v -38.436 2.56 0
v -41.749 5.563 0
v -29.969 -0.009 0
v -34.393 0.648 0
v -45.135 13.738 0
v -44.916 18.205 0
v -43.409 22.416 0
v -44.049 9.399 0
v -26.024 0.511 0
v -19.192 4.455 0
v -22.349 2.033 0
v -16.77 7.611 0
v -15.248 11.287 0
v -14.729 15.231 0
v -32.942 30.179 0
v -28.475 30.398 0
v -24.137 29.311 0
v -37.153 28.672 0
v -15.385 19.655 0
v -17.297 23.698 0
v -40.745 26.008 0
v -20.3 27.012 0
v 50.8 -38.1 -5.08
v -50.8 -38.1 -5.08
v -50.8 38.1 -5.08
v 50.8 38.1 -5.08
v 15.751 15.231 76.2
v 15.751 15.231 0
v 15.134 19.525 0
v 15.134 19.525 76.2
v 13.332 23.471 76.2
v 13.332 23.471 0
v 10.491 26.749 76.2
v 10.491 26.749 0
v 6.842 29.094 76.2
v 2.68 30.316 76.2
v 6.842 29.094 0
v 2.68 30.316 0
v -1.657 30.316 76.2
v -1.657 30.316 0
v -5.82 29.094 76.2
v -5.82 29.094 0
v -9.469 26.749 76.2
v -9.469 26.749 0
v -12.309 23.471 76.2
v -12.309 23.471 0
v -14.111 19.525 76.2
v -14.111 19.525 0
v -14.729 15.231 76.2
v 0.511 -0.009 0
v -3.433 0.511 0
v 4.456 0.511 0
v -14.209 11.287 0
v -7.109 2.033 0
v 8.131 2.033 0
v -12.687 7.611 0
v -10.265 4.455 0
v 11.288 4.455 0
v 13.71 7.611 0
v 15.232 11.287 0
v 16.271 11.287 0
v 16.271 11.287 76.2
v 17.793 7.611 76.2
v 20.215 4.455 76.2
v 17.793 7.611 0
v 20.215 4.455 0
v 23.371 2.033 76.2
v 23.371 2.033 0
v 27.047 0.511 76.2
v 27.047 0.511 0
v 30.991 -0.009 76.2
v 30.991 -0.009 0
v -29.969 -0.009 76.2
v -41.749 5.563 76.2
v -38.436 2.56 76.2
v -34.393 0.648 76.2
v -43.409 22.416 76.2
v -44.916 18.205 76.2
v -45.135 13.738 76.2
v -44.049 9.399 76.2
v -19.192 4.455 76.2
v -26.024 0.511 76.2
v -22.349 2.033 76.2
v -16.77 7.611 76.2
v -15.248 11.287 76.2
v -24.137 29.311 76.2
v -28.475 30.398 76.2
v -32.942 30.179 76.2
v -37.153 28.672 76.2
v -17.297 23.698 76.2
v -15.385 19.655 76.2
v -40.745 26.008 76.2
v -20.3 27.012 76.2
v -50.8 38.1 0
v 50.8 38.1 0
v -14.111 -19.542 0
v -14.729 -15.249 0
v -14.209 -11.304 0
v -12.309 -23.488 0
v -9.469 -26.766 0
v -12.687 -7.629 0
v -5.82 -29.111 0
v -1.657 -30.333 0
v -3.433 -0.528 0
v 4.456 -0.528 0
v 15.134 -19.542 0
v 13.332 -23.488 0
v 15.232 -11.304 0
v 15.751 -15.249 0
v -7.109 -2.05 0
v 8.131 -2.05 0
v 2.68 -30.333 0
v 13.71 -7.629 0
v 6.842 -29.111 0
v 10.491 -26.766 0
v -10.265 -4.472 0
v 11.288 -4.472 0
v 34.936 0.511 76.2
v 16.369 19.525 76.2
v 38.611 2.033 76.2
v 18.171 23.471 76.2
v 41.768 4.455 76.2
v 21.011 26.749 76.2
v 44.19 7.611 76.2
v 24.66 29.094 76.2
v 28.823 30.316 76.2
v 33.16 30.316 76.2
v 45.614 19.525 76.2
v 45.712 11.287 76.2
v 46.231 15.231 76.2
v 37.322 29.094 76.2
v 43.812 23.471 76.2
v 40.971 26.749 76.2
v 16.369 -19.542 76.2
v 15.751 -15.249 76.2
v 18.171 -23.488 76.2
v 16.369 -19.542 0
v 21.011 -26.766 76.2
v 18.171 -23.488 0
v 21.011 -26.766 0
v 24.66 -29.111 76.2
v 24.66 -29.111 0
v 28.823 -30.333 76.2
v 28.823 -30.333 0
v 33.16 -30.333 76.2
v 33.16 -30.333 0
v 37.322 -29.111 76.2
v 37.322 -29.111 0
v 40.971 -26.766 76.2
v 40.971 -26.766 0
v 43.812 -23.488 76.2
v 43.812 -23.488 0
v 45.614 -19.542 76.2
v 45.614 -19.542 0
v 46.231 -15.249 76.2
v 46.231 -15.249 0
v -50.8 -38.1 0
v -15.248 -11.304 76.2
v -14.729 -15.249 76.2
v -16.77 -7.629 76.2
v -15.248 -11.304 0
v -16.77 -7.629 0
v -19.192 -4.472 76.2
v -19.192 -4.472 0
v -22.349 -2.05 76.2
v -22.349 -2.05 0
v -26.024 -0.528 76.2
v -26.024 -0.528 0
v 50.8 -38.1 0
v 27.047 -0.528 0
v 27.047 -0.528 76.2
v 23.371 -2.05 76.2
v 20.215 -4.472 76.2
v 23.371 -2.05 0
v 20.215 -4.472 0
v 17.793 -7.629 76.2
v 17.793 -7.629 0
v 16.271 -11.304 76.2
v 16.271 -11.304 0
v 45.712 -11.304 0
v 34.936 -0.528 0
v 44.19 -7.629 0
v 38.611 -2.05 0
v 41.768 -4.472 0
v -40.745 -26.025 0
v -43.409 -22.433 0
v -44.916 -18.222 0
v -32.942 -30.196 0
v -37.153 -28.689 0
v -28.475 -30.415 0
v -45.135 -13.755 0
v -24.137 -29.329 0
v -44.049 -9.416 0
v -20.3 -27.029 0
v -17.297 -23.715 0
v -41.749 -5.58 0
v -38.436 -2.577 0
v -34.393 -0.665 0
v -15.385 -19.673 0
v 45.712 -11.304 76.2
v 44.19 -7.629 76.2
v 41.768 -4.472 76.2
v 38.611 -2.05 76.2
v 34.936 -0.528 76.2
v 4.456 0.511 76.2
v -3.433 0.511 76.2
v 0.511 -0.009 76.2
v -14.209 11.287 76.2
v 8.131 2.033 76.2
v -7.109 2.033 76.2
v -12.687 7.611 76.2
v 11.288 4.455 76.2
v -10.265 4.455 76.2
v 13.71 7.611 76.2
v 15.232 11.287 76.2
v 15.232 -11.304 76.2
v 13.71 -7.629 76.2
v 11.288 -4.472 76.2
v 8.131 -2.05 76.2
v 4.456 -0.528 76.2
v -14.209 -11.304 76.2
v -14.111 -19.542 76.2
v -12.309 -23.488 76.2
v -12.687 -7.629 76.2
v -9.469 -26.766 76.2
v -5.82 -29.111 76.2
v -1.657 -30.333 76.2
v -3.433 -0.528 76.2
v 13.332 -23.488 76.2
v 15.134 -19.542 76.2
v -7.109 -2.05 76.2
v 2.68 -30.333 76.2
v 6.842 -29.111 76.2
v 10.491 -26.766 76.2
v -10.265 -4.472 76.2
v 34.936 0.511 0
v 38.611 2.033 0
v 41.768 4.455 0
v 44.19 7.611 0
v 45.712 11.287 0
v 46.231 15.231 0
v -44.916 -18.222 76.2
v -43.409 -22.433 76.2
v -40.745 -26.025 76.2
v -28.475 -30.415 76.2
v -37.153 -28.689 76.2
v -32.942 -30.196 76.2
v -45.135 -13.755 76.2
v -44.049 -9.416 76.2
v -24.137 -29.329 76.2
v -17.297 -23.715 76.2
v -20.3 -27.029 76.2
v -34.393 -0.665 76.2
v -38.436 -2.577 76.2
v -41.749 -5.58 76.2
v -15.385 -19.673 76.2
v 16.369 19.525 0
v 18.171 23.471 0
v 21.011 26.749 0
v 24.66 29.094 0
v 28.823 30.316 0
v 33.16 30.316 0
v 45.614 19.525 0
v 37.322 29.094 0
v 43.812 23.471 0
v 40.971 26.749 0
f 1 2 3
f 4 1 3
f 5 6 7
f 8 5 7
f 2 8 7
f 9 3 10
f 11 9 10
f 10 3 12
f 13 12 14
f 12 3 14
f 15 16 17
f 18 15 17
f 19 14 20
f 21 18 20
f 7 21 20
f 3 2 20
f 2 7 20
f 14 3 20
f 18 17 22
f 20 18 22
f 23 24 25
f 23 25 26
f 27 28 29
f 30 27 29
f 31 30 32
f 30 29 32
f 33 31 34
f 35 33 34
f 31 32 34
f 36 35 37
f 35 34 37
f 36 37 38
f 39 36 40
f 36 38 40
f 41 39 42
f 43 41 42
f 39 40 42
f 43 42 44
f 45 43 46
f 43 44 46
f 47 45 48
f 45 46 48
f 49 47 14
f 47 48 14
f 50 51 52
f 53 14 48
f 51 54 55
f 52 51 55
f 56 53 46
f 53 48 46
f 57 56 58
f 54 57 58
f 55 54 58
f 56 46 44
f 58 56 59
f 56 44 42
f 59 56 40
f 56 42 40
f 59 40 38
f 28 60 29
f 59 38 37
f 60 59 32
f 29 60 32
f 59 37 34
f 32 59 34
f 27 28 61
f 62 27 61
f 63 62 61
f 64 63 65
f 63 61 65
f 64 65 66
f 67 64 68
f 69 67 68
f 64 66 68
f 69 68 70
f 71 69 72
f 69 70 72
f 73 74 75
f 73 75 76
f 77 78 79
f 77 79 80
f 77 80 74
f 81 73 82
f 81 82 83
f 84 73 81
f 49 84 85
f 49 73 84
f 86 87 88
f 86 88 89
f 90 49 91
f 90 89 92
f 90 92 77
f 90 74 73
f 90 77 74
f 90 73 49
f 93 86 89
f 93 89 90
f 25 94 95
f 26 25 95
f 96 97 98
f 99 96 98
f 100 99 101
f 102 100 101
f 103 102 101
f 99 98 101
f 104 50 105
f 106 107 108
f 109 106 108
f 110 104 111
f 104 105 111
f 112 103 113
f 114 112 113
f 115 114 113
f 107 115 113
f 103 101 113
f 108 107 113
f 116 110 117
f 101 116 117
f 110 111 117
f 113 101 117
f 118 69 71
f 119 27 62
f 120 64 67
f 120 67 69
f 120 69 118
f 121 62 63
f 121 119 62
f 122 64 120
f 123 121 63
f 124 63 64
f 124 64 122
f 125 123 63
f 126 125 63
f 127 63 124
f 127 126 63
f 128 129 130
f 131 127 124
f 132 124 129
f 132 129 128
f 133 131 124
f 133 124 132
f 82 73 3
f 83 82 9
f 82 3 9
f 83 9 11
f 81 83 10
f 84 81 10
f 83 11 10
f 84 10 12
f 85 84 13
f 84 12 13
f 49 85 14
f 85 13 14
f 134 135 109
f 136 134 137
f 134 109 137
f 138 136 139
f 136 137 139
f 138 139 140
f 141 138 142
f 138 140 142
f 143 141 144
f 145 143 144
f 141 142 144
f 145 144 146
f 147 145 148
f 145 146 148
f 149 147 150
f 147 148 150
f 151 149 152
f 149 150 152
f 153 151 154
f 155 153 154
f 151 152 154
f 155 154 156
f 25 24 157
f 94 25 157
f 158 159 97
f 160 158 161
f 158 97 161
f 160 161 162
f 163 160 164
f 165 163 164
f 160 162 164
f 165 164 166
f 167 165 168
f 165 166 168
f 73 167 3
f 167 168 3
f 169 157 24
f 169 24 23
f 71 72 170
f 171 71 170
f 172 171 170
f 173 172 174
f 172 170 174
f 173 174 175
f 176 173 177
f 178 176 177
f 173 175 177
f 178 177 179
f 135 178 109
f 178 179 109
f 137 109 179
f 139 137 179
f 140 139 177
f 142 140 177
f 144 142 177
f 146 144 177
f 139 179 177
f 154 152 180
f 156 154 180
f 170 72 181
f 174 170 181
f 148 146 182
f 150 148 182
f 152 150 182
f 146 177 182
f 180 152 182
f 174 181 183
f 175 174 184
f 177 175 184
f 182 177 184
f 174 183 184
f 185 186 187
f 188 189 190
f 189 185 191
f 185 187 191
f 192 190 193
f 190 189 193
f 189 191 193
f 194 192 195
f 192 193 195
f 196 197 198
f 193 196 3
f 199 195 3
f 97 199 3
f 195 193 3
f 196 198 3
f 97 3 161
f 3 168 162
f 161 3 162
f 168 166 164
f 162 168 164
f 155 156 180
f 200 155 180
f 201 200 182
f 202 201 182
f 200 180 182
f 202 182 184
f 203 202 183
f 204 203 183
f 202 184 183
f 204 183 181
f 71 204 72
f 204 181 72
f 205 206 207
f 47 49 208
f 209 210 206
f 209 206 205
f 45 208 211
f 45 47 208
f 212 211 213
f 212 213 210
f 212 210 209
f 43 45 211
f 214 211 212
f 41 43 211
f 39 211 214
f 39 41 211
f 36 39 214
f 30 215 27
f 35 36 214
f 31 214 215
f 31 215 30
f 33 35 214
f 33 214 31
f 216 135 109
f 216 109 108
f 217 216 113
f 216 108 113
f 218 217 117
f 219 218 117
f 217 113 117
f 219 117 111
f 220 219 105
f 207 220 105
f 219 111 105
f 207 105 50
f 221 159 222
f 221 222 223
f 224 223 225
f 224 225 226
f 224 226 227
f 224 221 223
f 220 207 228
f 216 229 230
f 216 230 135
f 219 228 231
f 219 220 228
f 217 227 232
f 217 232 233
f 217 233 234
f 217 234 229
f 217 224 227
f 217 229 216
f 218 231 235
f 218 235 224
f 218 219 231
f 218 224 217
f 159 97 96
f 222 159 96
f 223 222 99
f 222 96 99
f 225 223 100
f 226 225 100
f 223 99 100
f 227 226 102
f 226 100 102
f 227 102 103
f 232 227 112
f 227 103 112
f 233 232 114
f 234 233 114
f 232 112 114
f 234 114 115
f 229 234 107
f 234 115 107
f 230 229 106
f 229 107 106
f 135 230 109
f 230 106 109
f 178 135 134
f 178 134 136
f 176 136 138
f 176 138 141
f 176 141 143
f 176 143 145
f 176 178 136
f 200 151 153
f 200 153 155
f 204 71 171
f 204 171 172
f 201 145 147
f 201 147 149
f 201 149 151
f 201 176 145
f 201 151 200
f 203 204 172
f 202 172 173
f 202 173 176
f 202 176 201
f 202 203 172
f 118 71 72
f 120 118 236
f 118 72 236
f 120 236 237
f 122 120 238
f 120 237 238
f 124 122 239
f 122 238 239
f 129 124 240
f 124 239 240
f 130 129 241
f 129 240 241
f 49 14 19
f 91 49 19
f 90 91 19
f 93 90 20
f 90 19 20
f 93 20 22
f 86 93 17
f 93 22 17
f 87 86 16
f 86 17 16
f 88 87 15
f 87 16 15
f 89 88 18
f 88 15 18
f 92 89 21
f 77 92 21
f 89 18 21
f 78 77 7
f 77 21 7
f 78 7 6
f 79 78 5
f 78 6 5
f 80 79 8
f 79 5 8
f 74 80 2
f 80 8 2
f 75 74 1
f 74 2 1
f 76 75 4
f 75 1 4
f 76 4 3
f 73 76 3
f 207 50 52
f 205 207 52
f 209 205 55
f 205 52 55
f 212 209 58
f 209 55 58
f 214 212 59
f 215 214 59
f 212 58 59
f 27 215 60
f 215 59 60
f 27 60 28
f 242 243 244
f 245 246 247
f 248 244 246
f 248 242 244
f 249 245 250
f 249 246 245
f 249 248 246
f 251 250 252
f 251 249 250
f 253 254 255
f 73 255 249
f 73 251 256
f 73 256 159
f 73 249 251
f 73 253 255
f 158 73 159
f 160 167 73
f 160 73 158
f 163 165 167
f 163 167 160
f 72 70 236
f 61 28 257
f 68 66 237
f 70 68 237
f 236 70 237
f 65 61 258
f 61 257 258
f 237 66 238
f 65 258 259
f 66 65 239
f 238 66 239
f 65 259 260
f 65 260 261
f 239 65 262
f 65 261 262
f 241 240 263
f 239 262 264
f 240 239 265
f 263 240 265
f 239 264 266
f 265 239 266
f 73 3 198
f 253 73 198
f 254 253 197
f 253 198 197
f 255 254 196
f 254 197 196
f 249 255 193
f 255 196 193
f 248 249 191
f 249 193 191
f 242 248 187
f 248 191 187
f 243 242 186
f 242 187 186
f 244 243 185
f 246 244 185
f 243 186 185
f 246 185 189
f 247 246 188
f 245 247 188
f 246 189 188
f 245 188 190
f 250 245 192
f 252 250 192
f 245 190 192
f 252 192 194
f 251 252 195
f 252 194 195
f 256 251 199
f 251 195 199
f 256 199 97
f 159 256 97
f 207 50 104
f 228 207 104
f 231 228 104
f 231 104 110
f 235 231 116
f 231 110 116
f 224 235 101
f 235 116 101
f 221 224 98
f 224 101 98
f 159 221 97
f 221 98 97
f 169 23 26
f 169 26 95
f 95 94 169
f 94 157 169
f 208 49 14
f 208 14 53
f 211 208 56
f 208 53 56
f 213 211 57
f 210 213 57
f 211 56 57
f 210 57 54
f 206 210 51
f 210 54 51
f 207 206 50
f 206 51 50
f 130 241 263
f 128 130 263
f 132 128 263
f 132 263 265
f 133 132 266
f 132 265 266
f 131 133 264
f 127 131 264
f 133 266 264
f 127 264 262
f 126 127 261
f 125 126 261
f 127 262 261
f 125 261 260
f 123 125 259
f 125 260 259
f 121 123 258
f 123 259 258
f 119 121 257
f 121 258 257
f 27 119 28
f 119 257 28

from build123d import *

# Parameters (mm, degrees)
F1_DEPTH = 76.2
F2_W     = 101.6
F2_H     = 5.08
F3_DEPTH = 38.1


# Not quite as in the source:
# - a feature names something its author has since deleted; it is built from what else it names


with BuildPart() as f1:
    # F0 (on Top) → F1 (new body)
    with BuildSketch(Plane.XY):
        with BuildLine():
            ThreePointArc((-29.9686177893, -0.0085821988), (-40.7449251346, -26.0248895441), (-14.7286177893, -15.2485821988))
            ThreePointArc((-14.7286177893, -15.2485821988), (-19.192310444, -4.4722748535), (-29.9686177893, -0.0085821988))
        make_face()
    extrude(amount=F1_DEPTH)


with BuildPart() as f1b:
    # F0 (on Top) → F1, piece 2 (new body)
    with BuildSketch(Plane.XY):
        with BuildLine():
            ThreePointArc((0.5113822094, -0.0085821988), (-10.264925135, -4.472274854), (-14.7286177893, -15.2485821988))
            ThreePointArc((-14.7286177893, -15.2485821988), (0.5113822107, -30.4885821988), (15.7513822107, -15.2485821988))
            ThreePointArc((15.7513822107, -15.2485821988), (11.2876895555, -4.4722748531), (0.5113822094, -0.0085821988))
        make_face()
    extrude(amount=F1_DEPTH)


with BuildPart() as f1c:
    # F0 (on Top) → F1, piece 3 (new body)
    with BuildSketch(Plane.XY):
        with BuildLine():
            ThreePointArc((-14.7286177893, 15.2314178012), (-40.7449251346, 26.0077251465), (-29.9686177893, -0.0085821988))
            ThreePointArc((-29.9686177893, -0.0085821988), (-19.192310444, 4.4551104559), (-14.7286177893, 15.2314178012))
        make_face()
    extrude(amount=F1_DEPTH)


with BuildPart() as f1d:
    # F0 (on Top) → F1, piece 4 (new body)
    with BuildSketch(Plane.XY):
        with BuildLine():
            ThreePointArc((30.9913822354, -0.0085821988), (20.2150748742, -4.4722748448), (15.7513822107, -15.2485821988))
            ThreePointArc((15.7513822107, -15.2485821988), (30.9913822107, -30.4885821988), (46.2313822107, -15.2485821988))
            ThreePointArc((46.2313822107, -15.2485821988), (41.7676895647, -4.4722748623), (30.9913822354, -0.0085821988))
        make_face()
    extrude(amount=F1_DEPTH)


with BuildPart() as f1e:
    # F0 (on Top) → F1, piece 5 (new body)
    with BuildSketch(Plane.XY):
        with BuildLine():
            ThreePointArc((-14.7286177893, 15.2314178012), (-10.264925135, 4.4551104564), (0.5113822094, -0.0085821988))
            ThreePointArc((0.5113822094, -0.0085821988), (11.2876895555, 4.4551104555), (15.7513822107, 15.2314178012))
            ThreePointArc((15.7513822107, 15.2314178012), (0.5113822107, 30.4714178012), (-14.7286177893, 15.2314178012))
        make_face()
    extrude(amount=F1_DEPTH)


with BuildPart() as f1f:
    # F0 (on Top) → F1, piece 6 (new body)
    with BuildSketch(Plane.XY):
        with BuildLine():
            ThreePointArc((15.7513822107, 15.2314178012), (20.2150748742, 4.4551104472), (30.9913822354, -0.0085821988))
            ThreePointArc((30.9913822354, -0.0085821988), (41.7676895647, 4.4551104647), (46.2313822107, 15.2314178012))
            ThreePointArc((46.2313822107, 15.2314178012), (30.9913822107, 30.4714178012), (15.7513822107, 15.2314178012))
        make_face()
    extrude(amount=F1_DEPTH)


with BuildPart() as f3:
    # F2 (on Front) → F3 (new body, symmetric)
    with BuildSketch(Plane.XZ):
        with Locations((0, -2.54)):
            Rectangle(F2_W, F2_H)
    extrude(amount=F3_DEPTH, both=True)


solid = Compound([f1.part, f1b.part, f1c.part, f1d.part, f1e.part, f1f.part, f3.part])
